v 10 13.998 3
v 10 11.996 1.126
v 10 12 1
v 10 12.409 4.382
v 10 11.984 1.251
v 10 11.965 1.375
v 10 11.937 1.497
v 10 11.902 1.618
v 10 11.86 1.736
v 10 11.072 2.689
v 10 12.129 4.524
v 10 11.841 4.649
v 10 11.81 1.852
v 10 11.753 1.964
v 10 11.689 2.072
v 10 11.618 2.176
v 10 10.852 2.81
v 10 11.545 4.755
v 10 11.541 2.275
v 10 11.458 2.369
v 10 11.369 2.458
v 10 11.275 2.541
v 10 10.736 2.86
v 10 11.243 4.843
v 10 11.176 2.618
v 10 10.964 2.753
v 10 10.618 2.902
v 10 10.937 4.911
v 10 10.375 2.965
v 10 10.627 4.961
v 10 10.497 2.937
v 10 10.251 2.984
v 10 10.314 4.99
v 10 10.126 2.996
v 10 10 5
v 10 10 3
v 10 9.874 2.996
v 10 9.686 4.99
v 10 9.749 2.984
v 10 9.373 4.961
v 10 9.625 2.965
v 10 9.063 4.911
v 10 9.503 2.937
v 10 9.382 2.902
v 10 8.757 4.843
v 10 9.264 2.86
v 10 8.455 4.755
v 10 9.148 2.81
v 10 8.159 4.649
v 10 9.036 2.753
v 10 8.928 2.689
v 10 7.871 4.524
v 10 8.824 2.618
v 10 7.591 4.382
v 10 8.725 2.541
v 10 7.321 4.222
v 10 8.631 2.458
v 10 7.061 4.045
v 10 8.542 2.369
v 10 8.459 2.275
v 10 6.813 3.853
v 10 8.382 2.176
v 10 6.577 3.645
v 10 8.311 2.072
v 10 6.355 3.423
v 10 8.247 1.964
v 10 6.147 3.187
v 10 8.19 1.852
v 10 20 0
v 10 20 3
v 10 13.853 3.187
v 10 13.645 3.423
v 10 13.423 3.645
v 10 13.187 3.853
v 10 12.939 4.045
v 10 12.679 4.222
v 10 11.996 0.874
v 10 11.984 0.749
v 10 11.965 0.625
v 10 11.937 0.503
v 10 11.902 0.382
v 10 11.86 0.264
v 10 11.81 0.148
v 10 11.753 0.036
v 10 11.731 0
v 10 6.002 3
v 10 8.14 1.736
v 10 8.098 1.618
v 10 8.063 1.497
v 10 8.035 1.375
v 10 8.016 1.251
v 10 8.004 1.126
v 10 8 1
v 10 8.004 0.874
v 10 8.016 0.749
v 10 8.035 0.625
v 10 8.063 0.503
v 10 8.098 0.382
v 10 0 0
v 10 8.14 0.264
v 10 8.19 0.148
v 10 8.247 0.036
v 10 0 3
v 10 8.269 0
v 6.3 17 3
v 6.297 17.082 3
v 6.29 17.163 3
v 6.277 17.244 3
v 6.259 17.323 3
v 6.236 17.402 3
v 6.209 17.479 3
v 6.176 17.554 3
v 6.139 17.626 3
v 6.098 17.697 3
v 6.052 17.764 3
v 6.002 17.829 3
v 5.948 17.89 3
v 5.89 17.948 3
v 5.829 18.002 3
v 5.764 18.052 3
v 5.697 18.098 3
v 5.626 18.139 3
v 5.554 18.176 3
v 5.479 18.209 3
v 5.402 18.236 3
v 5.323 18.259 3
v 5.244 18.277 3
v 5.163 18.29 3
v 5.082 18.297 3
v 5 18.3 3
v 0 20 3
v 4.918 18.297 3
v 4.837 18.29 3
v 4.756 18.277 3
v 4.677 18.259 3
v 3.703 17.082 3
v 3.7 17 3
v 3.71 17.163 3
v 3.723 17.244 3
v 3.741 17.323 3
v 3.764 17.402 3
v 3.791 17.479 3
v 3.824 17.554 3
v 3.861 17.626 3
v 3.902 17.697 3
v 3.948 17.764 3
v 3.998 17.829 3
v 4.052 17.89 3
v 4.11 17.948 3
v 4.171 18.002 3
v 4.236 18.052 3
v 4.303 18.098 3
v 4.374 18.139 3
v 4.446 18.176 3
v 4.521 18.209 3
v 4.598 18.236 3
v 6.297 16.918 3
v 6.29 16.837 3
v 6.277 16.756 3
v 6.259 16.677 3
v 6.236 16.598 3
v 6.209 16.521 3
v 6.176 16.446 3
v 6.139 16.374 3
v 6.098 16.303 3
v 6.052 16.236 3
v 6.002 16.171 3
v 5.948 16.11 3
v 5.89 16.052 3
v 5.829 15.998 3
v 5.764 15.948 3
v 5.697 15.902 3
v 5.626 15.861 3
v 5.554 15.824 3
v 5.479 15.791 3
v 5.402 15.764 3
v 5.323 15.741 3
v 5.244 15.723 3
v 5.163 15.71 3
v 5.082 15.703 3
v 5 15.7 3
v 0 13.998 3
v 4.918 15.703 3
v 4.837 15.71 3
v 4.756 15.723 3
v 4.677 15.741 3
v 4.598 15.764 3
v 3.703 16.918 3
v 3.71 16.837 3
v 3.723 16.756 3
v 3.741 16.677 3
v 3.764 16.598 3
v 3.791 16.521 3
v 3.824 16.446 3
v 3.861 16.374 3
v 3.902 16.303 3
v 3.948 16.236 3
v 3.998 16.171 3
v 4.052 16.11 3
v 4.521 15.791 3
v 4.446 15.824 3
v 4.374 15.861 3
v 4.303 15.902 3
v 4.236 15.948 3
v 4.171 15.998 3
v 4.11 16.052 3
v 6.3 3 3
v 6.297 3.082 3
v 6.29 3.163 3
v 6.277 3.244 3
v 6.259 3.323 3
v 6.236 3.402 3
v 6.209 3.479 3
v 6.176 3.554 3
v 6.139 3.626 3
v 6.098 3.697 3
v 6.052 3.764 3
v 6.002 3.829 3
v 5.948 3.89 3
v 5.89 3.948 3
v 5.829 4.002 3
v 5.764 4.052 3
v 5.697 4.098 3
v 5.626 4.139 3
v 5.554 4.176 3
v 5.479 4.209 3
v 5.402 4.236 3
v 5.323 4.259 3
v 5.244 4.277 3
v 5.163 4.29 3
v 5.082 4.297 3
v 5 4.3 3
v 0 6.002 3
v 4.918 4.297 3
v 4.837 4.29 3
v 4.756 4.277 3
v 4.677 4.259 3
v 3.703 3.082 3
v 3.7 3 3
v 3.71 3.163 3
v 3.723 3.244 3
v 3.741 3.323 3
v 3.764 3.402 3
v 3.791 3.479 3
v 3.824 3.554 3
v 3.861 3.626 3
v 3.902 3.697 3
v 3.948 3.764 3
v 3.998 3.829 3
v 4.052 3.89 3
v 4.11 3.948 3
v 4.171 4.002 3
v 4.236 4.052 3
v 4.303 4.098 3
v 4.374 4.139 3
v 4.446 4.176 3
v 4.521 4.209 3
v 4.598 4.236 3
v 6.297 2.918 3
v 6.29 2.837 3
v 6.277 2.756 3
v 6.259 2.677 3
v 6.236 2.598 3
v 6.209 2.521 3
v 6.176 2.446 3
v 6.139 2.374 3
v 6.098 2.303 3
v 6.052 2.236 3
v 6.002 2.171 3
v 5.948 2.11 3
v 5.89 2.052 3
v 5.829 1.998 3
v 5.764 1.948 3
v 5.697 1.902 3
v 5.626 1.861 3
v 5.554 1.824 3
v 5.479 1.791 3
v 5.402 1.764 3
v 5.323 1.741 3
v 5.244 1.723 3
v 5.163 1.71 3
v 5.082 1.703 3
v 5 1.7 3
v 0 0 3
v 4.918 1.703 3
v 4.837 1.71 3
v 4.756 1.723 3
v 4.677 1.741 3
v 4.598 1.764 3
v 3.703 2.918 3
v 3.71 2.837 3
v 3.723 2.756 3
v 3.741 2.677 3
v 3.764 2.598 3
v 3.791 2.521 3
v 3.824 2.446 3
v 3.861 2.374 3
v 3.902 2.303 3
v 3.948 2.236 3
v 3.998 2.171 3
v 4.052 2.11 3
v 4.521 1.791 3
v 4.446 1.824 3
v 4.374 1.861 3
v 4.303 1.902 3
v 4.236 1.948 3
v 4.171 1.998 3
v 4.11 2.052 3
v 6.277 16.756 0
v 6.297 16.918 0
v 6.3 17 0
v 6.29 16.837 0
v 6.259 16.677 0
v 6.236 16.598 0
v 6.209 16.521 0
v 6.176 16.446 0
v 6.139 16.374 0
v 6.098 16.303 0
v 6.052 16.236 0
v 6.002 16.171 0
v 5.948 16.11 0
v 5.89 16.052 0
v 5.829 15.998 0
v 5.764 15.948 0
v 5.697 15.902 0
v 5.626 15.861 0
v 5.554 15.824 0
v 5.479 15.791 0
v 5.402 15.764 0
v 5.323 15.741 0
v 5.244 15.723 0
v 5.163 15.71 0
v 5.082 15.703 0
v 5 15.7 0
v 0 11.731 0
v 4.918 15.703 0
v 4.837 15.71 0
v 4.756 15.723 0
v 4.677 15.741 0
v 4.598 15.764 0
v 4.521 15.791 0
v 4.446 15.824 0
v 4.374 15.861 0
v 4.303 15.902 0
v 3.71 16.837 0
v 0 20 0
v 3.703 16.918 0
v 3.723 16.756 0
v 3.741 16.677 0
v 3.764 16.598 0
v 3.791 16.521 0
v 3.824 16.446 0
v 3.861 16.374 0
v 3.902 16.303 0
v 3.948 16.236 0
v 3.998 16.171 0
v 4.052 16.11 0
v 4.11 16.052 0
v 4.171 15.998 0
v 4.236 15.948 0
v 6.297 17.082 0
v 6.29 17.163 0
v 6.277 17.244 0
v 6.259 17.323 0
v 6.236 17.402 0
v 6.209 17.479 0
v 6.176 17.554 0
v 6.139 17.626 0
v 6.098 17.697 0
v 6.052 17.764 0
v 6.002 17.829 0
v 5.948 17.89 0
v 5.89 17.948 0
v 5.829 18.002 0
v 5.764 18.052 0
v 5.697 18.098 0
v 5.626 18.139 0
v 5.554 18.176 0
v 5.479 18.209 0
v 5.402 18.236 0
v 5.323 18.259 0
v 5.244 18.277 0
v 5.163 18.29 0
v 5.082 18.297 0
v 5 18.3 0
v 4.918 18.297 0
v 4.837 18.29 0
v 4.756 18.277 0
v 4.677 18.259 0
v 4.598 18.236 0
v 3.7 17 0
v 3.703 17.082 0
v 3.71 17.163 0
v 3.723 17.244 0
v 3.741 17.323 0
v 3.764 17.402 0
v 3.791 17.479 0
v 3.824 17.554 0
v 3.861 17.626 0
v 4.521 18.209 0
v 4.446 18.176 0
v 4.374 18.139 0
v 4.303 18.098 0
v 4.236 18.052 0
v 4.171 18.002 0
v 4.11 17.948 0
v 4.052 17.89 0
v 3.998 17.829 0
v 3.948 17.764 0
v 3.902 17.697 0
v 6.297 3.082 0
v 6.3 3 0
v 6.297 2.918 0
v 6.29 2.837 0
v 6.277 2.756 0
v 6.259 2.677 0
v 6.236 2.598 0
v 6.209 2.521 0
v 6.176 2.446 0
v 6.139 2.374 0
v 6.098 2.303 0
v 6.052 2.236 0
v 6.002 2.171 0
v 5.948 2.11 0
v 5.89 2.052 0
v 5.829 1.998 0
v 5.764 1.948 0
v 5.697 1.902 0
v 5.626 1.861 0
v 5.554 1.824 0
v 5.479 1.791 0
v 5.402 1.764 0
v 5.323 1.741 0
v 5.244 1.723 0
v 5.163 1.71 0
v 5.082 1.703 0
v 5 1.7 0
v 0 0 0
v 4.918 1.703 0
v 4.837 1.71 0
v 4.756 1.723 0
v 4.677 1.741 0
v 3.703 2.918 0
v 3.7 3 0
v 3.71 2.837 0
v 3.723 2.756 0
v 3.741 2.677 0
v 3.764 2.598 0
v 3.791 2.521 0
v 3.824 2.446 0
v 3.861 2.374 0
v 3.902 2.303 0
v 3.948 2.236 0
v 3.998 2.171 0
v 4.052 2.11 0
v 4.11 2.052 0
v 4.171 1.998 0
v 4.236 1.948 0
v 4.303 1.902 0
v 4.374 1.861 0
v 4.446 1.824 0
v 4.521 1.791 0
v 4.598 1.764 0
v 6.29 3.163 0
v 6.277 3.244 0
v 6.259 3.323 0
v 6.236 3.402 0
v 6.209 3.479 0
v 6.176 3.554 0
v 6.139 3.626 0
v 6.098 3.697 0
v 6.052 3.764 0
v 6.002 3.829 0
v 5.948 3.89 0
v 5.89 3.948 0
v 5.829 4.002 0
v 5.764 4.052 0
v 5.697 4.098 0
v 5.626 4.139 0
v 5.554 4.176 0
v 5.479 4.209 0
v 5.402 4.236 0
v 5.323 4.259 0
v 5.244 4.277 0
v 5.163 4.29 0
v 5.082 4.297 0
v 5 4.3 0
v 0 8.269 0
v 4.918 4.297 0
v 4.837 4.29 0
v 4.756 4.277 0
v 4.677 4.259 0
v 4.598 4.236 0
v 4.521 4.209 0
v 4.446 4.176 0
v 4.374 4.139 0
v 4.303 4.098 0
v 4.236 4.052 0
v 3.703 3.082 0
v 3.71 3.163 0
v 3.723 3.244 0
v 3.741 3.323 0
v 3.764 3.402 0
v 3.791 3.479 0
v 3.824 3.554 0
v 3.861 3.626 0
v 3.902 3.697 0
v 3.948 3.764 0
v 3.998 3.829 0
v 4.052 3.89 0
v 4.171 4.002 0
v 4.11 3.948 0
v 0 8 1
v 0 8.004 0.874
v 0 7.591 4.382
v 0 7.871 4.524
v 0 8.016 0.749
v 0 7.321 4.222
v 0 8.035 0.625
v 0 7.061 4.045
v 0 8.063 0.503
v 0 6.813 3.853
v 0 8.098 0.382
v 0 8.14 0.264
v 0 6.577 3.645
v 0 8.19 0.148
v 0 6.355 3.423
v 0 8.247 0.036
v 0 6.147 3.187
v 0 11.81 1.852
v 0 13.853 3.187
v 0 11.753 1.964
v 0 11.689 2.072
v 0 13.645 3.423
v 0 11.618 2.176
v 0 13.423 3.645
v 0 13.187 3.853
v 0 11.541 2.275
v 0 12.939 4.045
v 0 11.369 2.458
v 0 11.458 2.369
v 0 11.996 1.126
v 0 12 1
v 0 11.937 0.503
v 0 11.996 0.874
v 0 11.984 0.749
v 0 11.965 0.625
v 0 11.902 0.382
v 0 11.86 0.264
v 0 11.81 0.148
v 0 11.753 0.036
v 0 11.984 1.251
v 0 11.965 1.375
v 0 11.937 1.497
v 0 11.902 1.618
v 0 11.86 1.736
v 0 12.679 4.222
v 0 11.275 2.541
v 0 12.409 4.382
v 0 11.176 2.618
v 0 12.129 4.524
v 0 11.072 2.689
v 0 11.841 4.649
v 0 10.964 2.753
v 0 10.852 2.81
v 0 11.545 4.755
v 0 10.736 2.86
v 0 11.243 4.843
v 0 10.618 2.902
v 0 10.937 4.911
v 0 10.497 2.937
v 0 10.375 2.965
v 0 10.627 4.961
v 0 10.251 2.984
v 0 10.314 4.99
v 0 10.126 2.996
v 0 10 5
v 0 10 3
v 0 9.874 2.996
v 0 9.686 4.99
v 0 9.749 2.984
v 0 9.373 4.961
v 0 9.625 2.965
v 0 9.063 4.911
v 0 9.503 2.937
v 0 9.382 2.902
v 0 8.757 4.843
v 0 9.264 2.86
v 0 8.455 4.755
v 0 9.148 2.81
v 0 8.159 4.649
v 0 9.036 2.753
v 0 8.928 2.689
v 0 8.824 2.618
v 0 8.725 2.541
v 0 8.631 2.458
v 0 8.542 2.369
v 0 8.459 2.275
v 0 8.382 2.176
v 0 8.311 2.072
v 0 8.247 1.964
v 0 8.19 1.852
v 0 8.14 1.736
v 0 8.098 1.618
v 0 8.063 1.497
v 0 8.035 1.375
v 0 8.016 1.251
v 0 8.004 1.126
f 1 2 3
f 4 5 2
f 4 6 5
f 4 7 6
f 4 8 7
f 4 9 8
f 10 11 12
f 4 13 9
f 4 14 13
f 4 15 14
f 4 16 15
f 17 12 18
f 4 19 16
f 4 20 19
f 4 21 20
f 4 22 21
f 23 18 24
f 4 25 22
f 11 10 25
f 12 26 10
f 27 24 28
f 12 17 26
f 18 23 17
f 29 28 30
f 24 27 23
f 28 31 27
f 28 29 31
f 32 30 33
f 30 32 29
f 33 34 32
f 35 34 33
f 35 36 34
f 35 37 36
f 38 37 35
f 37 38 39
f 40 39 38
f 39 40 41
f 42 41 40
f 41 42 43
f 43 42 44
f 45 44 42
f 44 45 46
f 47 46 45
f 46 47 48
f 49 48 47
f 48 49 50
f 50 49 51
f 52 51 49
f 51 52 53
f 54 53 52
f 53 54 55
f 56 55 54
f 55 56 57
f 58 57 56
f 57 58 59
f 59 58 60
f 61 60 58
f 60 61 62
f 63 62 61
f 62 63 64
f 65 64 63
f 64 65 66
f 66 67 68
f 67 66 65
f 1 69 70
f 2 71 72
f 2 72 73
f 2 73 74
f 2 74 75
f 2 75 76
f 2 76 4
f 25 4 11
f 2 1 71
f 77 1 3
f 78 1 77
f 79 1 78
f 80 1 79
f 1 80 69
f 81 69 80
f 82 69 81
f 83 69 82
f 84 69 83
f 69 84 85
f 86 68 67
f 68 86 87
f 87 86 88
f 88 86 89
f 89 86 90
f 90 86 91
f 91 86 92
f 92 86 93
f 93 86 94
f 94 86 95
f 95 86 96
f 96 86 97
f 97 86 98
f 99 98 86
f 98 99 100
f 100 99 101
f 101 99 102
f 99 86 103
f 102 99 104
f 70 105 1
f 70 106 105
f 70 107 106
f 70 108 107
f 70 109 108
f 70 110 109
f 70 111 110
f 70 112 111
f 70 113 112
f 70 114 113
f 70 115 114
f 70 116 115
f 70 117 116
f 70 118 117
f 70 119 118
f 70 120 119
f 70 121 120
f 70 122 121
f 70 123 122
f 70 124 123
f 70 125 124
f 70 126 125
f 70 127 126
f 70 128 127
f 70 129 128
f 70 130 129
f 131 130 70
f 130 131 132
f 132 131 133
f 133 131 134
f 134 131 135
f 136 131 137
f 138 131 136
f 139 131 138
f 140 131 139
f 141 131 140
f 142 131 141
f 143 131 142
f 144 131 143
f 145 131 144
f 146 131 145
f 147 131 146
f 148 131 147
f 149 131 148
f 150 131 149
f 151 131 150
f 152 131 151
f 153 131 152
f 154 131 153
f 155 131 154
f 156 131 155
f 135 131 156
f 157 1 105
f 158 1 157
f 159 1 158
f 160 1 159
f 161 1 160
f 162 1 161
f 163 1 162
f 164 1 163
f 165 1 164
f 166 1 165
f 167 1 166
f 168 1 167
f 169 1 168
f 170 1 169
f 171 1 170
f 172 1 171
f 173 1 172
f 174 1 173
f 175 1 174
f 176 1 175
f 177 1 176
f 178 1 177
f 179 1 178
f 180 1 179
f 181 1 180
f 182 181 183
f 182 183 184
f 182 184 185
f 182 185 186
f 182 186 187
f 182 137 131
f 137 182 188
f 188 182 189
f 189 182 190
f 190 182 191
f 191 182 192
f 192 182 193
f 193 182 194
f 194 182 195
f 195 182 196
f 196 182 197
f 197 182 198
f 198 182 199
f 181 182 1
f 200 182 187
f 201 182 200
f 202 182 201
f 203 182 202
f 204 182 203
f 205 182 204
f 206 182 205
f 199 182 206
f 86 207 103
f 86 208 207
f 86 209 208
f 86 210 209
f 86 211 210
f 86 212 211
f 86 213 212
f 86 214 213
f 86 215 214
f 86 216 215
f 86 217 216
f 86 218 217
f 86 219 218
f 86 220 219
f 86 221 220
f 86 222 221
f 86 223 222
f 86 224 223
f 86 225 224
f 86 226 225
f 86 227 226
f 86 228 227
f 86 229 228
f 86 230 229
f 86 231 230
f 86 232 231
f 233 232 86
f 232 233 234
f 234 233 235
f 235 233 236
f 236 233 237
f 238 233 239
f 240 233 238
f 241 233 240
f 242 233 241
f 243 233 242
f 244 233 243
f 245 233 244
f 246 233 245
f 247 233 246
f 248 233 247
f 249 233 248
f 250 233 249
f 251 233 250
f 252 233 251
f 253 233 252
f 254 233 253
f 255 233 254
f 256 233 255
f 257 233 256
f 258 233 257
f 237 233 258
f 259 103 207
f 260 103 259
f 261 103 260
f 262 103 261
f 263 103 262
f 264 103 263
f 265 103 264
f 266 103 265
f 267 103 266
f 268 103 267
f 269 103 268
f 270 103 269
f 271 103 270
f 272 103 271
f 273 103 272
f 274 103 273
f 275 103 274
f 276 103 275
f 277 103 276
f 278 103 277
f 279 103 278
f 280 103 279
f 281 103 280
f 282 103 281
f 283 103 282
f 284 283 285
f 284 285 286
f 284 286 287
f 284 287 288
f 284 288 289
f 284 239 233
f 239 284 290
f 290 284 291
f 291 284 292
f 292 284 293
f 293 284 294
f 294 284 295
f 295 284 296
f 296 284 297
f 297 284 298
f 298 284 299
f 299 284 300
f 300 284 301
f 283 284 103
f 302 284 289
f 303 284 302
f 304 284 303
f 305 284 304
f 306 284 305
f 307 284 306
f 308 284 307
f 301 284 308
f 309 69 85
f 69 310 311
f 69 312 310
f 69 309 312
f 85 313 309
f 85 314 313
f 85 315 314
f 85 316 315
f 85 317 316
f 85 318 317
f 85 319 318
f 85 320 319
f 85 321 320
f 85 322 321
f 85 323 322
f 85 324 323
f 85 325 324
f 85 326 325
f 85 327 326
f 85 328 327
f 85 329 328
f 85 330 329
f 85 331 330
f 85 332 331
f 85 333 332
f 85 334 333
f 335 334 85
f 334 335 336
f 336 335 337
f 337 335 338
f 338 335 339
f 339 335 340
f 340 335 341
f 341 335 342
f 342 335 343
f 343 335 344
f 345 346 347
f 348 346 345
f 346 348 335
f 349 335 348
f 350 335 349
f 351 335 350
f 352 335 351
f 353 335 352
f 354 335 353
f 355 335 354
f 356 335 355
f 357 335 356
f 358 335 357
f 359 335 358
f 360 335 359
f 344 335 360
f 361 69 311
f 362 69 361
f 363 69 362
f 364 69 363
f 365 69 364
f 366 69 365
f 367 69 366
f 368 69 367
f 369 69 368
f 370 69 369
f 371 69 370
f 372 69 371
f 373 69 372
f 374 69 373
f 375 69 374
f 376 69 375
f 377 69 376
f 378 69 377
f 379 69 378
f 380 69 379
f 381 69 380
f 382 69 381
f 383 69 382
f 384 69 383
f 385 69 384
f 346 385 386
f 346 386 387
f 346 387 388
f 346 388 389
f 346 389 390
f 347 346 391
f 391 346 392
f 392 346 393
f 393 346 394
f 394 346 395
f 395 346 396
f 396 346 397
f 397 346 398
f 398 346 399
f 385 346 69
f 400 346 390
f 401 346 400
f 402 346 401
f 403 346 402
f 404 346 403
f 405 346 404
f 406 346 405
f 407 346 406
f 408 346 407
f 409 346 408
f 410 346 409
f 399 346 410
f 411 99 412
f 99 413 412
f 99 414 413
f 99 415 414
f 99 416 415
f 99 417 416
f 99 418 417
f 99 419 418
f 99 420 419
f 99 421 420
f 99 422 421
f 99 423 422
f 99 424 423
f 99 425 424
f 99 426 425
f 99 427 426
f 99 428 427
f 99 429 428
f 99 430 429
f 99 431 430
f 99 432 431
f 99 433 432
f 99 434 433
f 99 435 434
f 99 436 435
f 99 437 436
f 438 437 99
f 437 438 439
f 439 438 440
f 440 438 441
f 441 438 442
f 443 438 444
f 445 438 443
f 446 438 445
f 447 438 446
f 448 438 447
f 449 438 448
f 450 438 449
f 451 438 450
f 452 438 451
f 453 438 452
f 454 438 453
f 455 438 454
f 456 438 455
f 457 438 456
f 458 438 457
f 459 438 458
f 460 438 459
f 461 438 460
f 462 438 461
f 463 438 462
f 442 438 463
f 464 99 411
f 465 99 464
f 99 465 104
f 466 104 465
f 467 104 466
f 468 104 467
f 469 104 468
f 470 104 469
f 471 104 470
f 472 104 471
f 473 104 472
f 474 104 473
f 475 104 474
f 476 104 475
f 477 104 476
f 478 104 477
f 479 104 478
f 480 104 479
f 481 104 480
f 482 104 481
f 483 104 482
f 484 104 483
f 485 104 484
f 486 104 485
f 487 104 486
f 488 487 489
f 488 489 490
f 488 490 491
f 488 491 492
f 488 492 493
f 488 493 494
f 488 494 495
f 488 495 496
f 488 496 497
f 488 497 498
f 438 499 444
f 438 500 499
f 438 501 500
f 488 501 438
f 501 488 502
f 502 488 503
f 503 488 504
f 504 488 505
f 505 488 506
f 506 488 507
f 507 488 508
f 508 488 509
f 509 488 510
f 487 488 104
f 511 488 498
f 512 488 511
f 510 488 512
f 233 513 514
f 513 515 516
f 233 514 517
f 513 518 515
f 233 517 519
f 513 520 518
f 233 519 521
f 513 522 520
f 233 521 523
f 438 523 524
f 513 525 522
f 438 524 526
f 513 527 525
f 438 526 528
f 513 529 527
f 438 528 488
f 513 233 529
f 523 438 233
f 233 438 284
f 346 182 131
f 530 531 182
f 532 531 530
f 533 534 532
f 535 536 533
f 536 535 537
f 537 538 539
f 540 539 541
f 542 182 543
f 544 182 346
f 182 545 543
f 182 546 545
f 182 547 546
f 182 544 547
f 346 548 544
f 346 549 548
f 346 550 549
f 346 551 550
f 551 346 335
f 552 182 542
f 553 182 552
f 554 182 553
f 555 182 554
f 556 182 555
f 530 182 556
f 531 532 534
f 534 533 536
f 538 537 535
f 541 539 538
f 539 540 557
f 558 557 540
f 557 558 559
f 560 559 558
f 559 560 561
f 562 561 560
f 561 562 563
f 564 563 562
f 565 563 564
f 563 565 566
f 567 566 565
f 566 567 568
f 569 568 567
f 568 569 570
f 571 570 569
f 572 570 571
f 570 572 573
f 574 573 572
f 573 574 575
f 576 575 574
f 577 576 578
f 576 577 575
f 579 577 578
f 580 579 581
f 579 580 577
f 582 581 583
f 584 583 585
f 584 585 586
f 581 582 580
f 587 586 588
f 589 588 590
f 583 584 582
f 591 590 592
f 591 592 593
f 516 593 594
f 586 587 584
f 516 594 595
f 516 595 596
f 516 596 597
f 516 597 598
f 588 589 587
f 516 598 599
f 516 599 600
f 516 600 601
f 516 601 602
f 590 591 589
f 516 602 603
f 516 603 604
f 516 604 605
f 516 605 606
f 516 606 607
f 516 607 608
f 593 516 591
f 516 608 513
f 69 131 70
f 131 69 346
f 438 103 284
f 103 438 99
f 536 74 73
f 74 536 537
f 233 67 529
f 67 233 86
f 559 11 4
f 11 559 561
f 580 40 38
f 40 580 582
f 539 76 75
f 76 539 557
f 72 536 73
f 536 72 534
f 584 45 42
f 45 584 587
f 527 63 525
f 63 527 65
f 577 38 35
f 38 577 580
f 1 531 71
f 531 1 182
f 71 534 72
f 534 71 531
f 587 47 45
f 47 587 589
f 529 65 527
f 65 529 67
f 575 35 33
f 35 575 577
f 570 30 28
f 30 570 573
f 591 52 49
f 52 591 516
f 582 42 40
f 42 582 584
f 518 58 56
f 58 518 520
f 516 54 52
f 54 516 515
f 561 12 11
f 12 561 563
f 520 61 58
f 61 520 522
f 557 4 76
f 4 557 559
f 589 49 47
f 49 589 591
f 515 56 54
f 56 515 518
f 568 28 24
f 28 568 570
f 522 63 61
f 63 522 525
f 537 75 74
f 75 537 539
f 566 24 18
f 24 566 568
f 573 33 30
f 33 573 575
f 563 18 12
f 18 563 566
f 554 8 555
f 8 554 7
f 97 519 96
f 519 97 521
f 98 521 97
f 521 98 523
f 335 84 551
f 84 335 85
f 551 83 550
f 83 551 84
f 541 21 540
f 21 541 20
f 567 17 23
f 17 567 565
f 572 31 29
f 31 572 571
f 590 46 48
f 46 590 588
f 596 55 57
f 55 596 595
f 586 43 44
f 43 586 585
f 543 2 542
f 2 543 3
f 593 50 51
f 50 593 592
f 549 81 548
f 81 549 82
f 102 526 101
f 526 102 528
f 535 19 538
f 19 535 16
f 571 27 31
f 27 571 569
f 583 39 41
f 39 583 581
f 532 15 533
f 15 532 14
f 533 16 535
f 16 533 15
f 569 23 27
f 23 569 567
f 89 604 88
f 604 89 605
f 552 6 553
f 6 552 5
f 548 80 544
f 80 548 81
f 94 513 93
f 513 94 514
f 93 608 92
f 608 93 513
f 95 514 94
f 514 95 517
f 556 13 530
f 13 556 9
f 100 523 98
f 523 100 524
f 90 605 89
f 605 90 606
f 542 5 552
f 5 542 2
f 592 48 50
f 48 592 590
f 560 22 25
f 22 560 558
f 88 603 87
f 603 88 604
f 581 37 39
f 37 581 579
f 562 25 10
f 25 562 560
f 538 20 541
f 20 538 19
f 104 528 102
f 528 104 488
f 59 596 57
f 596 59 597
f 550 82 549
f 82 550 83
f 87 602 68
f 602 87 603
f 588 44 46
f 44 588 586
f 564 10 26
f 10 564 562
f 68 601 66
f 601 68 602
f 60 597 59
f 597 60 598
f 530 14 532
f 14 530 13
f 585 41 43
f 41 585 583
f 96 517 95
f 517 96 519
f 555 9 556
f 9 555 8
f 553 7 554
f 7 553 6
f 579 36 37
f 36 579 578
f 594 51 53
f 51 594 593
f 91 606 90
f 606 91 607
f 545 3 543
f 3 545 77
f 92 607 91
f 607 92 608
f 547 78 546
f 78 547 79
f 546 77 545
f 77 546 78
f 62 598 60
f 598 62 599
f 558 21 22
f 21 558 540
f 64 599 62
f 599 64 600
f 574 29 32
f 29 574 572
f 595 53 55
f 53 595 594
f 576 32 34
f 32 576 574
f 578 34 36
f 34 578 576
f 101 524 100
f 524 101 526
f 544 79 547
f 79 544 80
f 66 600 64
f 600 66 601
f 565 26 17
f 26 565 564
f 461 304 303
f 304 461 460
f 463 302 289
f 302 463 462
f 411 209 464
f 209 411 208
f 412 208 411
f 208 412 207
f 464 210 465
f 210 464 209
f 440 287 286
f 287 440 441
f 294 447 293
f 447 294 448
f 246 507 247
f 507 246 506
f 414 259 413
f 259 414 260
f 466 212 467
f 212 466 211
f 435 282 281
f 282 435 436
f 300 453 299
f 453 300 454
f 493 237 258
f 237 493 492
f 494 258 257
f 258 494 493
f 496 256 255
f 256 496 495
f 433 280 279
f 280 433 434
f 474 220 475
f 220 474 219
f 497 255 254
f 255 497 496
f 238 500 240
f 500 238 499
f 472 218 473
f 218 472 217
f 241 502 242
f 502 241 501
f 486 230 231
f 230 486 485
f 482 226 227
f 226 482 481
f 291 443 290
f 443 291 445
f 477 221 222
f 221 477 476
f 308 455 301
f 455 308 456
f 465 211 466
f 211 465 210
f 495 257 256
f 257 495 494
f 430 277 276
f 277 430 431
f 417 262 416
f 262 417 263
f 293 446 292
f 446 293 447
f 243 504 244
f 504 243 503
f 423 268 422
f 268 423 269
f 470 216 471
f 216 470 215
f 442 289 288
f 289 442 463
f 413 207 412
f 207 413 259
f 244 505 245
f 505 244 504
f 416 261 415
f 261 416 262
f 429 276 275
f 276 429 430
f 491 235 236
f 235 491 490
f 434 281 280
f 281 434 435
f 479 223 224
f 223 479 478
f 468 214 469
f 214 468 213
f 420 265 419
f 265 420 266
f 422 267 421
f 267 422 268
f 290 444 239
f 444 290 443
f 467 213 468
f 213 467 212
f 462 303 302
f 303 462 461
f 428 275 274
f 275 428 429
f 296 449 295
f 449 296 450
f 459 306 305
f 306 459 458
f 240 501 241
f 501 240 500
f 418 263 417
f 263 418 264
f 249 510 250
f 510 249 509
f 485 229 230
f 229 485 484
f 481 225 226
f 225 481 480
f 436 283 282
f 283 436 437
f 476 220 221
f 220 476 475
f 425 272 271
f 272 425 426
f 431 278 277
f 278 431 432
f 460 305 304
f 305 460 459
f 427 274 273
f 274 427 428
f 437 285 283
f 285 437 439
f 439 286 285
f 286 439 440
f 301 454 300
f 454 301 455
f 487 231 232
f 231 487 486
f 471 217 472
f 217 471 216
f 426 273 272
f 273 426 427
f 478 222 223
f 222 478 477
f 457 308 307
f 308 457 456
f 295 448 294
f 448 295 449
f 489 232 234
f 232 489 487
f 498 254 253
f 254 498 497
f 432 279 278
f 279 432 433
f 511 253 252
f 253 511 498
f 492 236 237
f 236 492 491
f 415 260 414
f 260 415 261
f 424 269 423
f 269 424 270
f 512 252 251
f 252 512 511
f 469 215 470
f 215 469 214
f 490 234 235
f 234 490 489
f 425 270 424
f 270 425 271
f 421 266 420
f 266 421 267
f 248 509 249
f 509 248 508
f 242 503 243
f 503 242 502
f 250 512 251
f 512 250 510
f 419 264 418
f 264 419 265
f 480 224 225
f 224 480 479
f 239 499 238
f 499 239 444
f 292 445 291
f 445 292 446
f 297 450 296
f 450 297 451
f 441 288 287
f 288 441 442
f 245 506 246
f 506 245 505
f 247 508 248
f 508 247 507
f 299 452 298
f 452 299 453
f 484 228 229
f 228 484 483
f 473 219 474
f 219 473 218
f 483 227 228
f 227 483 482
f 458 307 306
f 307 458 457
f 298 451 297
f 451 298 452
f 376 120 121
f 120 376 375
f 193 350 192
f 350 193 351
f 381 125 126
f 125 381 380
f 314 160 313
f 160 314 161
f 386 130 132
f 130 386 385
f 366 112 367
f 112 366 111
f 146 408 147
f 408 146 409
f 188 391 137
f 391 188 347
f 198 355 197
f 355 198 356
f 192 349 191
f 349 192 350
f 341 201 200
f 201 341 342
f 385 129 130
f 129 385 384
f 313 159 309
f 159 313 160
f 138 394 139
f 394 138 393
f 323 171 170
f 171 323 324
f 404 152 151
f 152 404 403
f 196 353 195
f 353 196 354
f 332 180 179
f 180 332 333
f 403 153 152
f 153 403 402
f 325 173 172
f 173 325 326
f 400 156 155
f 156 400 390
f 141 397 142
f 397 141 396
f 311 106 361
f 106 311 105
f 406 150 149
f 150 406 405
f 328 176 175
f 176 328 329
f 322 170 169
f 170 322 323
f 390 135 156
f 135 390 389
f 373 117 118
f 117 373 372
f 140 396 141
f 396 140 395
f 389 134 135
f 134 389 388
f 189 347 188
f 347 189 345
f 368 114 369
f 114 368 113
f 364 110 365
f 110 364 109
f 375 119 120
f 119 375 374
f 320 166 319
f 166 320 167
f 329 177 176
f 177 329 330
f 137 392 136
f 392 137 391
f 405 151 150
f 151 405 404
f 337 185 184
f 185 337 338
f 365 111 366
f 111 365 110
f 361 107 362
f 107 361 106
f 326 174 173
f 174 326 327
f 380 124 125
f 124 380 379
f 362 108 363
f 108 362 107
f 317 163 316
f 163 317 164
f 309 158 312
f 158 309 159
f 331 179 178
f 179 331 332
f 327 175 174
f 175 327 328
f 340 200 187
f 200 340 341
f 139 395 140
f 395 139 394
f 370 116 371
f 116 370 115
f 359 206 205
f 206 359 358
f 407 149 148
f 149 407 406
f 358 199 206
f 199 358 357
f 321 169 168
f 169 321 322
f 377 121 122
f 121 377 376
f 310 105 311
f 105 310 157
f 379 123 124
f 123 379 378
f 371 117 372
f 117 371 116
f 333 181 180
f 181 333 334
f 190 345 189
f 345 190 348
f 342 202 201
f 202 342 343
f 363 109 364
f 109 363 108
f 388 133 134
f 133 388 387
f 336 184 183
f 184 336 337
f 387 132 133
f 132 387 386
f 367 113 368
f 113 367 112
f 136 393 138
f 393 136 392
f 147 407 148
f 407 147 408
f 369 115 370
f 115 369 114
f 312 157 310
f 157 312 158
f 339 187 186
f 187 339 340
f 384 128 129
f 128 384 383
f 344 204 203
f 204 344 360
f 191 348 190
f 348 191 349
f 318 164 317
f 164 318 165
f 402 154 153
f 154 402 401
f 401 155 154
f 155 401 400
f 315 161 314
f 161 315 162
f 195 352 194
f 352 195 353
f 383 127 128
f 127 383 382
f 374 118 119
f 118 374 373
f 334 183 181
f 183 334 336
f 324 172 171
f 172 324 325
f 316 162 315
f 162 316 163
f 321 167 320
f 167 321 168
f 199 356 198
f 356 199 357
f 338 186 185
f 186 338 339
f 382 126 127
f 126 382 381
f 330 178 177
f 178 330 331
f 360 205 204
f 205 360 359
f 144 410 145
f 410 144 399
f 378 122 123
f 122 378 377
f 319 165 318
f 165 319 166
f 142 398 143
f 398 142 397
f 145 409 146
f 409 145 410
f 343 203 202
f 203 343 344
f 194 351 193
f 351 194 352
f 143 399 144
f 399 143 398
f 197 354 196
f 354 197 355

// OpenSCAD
$fn=100;
diametro_filo = 4;

diametro_viti_fissaggio = 2.6;

module Staffa(){
    cube([10,20,3]);
    translate([0,10,0]){
        rotate([0,90,0]){
                cylinder(10,5,5);
        }
    }
}


module Occhiello(){
    difference(){
        Staffa();
        {
        rotate([0,90,0]){
            translate([-1,10,0]){
                cylinder(10,diametro_filo/2,diametro_filo/2);
            }
            }
        }
    }
}

module Pressacavo(){
    difference(){
        Occhiello();
        {
            for ( i = [3,17]){
                translate([5,i,0]){
                    cylinder(5,diametro_viti_fissaggio/2,diametro_viti_fissaggio/2);
                }
            }
        translate([-1,-1,-10]){
            cube([12,22,10]);
            
            }
        }
    }
}

Pressacavo();
